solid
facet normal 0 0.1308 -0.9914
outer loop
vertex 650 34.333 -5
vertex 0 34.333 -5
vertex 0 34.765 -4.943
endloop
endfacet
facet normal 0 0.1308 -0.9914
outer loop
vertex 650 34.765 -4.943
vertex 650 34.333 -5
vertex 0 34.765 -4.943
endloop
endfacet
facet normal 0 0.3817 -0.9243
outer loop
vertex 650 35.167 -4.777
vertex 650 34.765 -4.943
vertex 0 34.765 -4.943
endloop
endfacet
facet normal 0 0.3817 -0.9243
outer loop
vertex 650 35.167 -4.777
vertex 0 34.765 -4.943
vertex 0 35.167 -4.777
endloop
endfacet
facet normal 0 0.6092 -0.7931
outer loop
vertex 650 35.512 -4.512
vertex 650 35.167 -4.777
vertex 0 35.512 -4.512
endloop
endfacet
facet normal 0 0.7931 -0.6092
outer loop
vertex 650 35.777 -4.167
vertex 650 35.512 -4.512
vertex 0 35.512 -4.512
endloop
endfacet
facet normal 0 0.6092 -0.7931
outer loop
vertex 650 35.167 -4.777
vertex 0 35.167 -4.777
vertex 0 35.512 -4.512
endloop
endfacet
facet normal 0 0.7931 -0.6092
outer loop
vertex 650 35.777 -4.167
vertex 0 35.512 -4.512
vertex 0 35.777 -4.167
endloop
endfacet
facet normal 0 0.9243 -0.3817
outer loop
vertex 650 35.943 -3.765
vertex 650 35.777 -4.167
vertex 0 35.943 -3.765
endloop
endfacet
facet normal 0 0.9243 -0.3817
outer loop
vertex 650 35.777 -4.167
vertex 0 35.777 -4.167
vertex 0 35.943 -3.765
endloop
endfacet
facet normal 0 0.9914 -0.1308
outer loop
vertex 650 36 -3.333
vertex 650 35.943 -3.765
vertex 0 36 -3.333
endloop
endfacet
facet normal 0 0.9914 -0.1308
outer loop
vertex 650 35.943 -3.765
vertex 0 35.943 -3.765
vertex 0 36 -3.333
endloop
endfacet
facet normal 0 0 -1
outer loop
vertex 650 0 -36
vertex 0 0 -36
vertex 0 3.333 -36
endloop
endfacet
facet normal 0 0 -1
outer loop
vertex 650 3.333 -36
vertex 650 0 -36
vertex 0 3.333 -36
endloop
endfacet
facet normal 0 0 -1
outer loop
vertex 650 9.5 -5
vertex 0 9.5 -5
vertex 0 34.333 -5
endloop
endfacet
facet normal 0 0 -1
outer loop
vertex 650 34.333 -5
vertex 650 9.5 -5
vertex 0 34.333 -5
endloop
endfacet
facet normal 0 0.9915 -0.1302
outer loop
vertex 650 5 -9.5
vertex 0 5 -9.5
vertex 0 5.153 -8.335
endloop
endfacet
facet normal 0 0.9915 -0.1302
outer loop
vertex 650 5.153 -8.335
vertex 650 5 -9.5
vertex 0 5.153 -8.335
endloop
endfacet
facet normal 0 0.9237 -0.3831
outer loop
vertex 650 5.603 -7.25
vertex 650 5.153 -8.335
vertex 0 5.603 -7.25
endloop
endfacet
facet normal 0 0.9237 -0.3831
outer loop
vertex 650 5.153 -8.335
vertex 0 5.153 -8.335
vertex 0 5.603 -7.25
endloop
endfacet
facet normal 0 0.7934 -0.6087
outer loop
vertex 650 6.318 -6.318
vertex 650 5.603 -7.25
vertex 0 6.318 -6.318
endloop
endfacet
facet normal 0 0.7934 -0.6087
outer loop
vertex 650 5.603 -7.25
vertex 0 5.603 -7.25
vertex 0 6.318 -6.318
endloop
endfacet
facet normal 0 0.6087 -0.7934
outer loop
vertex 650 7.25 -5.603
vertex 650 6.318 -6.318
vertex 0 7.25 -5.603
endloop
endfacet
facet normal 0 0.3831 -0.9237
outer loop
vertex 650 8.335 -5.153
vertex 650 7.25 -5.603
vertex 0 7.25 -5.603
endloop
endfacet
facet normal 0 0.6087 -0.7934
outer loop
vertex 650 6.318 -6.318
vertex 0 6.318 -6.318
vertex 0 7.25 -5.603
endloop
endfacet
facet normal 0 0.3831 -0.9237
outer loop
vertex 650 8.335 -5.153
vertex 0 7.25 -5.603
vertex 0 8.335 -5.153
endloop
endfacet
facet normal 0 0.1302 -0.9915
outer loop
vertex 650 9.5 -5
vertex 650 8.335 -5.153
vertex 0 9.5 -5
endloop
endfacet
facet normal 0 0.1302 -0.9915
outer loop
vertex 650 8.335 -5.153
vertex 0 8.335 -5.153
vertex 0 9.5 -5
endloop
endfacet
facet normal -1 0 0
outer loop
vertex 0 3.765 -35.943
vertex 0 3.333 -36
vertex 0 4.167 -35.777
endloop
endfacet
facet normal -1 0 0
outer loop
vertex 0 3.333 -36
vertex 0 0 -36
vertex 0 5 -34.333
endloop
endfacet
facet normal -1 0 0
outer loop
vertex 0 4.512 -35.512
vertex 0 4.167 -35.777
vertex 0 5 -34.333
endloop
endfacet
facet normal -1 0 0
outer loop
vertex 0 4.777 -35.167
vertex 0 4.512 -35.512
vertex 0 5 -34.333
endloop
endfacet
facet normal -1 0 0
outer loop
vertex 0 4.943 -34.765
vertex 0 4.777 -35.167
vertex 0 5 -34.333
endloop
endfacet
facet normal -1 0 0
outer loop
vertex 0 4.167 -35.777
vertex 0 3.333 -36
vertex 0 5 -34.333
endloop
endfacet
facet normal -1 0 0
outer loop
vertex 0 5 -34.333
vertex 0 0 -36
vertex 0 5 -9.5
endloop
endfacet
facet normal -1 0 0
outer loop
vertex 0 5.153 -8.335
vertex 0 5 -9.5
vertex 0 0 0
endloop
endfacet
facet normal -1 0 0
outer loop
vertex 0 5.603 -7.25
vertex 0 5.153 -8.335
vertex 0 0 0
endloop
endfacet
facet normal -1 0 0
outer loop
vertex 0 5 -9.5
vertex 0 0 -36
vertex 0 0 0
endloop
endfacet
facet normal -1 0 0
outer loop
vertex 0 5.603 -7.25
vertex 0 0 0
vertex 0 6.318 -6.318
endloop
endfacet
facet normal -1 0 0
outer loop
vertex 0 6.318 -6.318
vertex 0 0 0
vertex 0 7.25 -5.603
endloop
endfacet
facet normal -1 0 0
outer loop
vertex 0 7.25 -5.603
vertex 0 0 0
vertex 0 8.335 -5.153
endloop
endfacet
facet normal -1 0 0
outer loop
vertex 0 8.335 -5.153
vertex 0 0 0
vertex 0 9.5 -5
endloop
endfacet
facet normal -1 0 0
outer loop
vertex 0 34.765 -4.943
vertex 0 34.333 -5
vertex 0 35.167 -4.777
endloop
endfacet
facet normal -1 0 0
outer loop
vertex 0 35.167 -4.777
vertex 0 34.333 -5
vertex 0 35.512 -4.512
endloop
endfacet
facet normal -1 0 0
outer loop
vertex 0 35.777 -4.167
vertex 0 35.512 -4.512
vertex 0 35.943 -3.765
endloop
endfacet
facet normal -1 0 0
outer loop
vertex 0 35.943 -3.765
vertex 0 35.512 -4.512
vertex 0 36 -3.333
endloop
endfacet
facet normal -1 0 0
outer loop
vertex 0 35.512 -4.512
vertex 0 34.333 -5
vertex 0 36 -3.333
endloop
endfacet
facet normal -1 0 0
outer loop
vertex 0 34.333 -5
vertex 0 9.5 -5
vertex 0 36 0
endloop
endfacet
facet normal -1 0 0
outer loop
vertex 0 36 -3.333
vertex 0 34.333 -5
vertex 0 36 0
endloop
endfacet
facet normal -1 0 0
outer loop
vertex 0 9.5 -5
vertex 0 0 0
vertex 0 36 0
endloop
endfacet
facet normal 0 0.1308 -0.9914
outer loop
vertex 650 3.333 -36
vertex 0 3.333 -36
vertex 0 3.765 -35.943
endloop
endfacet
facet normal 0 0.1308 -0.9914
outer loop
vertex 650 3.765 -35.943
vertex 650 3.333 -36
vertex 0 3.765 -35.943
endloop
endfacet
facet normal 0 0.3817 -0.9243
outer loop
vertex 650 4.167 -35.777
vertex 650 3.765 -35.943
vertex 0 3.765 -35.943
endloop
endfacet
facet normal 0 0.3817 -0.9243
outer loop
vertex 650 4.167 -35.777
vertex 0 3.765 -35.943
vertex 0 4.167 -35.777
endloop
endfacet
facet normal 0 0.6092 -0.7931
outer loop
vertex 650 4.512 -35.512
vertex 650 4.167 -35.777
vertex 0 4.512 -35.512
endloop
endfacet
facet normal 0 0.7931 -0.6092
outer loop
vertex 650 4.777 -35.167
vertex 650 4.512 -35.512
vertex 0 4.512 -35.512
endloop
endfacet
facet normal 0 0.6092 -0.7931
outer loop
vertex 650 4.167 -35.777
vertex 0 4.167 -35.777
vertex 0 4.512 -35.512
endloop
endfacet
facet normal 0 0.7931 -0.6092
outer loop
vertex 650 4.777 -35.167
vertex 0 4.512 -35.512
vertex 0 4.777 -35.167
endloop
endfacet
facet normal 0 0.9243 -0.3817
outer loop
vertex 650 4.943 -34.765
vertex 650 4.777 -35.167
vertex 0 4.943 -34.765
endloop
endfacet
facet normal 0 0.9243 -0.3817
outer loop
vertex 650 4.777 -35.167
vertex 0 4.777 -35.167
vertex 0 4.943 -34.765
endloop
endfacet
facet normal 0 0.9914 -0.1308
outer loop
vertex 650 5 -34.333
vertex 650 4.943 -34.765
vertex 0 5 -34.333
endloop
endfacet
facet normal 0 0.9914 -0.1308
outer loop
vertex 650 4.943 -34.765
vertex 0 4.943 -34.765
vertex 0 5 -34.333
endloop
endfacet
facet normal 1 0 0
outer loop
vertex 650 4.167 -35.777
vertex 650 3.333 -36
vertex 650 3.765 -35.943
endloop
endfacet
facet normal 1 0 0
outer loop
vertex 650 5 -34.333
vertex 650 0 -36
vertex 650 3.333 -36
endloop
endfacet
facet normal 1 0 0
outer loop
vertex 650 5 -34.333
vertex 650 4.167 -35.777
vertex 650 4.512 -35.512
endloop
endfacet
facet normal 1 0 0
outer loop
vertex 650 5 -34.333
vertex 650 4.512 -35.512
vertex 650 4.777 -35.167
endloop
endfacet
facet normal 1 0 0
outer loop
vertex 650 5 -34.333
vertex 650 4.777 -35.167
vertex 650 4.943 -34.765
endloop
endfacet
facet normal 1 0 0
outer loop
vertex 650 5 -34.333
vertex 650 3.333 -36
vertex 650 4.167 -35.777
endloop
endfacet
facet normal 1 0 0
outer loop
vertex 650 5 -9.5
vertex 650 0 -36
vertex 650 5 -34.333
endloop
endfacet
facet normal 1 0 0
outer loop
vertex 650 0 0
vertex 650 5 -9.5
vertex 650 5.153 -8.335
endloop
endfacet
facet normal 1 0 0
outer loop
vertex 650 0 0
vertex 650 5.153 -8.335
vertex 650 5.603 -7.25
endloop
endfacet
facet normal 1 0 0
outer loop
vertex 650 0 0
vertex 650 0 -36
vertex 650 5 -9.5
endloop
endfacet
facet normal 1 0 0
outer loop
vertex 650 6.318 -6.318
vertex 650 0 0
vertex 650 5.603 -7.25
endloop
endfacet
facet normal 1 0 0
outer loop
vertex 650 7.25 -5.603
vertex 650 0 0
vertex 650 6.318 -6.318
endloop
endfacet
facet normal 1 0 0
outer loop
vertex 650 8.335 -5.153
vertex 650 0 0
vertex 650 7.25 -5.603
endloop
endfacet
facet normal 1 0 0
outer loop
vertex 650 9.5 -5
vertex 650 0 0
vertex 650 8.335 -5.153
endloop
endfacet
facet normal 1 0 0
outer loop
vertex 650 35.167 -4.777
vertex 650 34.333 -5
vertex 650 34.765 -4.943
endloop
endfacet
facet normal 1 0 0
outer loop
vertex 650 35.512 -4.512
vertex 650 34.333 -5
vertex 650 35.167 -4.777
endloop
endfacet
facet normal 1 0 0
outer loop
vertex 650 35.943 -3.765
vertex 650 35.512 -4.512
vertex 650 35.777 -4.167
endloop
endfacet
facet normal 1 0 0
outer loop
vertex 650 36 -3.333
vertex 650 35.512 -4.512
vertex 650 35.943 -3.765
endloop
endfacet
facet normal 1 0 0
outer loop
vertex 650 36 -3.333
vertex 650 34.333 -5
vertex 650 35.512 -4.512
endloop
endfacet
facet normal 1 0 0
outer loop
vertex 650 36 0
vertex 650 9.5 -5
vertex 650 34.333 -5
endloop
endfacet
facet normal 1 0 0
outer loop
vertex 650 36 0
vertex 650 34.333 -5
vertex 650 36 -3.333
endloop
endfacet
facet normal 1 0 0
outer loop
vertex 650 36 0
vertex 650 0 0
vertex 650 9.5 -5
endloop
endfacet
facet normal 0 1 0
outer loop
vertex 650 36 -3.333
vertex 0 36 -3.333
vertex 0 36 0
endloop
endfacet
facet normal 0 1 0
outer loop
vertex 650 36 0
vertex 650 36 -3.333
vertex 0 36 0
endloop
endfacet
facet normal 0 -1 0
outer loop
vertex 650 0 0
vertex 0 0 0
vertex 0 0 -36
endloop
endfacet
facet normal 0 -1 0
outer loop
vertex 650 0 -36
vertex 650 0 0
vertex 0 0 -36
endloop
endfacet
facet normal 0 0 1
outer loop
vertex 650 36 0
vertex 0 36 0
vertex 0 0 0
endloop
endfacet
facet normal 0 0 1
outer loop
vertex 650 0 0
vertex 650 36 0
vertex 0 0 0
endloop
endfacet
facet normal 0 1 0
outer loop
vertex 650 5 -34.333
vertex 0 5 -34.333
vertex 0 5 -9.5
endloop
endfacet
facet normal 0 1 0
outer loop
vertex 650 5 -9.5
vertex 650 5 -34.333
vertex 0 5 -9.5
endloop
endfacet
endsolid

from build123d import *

# Parameters (mm, degrees)
L_ANGLE_EQUAL_3_6X5_1_DEPTH = 650


with BuildPart() as part:
    # Sketch1 → L angle (equal) 3.6X5(1) (new body)
    with BuildSketch(Plane.YZ):
        with BuildLine():
            Line((36, 0), (0, 0))
            Line((0, 0), (0, -36))
            Line((0, -36), (3.333333333, -36))
            ThreePointArc((3.333333333, -36), (4.511844635, -35.511844635), (5, -34.333333333))
            Line((5, -34.333333333), (5, -9.5))
            ThreePointArc((5, -9.5), (6.318019485, -6.318019485), (9.5, -5))
            Line((9.5, -5), (34.333333333, -5))
            ThreePointArc((34.333333333, -5), (35.511844635, -4.511844635), (36, -3.333333333))
            Line((36, -3.333333333), (36, 0))
        make_face()
    extrude(amount=L_ANGLE_EQUAL_3_6X5_1_DEPTH)


solid = part.part
